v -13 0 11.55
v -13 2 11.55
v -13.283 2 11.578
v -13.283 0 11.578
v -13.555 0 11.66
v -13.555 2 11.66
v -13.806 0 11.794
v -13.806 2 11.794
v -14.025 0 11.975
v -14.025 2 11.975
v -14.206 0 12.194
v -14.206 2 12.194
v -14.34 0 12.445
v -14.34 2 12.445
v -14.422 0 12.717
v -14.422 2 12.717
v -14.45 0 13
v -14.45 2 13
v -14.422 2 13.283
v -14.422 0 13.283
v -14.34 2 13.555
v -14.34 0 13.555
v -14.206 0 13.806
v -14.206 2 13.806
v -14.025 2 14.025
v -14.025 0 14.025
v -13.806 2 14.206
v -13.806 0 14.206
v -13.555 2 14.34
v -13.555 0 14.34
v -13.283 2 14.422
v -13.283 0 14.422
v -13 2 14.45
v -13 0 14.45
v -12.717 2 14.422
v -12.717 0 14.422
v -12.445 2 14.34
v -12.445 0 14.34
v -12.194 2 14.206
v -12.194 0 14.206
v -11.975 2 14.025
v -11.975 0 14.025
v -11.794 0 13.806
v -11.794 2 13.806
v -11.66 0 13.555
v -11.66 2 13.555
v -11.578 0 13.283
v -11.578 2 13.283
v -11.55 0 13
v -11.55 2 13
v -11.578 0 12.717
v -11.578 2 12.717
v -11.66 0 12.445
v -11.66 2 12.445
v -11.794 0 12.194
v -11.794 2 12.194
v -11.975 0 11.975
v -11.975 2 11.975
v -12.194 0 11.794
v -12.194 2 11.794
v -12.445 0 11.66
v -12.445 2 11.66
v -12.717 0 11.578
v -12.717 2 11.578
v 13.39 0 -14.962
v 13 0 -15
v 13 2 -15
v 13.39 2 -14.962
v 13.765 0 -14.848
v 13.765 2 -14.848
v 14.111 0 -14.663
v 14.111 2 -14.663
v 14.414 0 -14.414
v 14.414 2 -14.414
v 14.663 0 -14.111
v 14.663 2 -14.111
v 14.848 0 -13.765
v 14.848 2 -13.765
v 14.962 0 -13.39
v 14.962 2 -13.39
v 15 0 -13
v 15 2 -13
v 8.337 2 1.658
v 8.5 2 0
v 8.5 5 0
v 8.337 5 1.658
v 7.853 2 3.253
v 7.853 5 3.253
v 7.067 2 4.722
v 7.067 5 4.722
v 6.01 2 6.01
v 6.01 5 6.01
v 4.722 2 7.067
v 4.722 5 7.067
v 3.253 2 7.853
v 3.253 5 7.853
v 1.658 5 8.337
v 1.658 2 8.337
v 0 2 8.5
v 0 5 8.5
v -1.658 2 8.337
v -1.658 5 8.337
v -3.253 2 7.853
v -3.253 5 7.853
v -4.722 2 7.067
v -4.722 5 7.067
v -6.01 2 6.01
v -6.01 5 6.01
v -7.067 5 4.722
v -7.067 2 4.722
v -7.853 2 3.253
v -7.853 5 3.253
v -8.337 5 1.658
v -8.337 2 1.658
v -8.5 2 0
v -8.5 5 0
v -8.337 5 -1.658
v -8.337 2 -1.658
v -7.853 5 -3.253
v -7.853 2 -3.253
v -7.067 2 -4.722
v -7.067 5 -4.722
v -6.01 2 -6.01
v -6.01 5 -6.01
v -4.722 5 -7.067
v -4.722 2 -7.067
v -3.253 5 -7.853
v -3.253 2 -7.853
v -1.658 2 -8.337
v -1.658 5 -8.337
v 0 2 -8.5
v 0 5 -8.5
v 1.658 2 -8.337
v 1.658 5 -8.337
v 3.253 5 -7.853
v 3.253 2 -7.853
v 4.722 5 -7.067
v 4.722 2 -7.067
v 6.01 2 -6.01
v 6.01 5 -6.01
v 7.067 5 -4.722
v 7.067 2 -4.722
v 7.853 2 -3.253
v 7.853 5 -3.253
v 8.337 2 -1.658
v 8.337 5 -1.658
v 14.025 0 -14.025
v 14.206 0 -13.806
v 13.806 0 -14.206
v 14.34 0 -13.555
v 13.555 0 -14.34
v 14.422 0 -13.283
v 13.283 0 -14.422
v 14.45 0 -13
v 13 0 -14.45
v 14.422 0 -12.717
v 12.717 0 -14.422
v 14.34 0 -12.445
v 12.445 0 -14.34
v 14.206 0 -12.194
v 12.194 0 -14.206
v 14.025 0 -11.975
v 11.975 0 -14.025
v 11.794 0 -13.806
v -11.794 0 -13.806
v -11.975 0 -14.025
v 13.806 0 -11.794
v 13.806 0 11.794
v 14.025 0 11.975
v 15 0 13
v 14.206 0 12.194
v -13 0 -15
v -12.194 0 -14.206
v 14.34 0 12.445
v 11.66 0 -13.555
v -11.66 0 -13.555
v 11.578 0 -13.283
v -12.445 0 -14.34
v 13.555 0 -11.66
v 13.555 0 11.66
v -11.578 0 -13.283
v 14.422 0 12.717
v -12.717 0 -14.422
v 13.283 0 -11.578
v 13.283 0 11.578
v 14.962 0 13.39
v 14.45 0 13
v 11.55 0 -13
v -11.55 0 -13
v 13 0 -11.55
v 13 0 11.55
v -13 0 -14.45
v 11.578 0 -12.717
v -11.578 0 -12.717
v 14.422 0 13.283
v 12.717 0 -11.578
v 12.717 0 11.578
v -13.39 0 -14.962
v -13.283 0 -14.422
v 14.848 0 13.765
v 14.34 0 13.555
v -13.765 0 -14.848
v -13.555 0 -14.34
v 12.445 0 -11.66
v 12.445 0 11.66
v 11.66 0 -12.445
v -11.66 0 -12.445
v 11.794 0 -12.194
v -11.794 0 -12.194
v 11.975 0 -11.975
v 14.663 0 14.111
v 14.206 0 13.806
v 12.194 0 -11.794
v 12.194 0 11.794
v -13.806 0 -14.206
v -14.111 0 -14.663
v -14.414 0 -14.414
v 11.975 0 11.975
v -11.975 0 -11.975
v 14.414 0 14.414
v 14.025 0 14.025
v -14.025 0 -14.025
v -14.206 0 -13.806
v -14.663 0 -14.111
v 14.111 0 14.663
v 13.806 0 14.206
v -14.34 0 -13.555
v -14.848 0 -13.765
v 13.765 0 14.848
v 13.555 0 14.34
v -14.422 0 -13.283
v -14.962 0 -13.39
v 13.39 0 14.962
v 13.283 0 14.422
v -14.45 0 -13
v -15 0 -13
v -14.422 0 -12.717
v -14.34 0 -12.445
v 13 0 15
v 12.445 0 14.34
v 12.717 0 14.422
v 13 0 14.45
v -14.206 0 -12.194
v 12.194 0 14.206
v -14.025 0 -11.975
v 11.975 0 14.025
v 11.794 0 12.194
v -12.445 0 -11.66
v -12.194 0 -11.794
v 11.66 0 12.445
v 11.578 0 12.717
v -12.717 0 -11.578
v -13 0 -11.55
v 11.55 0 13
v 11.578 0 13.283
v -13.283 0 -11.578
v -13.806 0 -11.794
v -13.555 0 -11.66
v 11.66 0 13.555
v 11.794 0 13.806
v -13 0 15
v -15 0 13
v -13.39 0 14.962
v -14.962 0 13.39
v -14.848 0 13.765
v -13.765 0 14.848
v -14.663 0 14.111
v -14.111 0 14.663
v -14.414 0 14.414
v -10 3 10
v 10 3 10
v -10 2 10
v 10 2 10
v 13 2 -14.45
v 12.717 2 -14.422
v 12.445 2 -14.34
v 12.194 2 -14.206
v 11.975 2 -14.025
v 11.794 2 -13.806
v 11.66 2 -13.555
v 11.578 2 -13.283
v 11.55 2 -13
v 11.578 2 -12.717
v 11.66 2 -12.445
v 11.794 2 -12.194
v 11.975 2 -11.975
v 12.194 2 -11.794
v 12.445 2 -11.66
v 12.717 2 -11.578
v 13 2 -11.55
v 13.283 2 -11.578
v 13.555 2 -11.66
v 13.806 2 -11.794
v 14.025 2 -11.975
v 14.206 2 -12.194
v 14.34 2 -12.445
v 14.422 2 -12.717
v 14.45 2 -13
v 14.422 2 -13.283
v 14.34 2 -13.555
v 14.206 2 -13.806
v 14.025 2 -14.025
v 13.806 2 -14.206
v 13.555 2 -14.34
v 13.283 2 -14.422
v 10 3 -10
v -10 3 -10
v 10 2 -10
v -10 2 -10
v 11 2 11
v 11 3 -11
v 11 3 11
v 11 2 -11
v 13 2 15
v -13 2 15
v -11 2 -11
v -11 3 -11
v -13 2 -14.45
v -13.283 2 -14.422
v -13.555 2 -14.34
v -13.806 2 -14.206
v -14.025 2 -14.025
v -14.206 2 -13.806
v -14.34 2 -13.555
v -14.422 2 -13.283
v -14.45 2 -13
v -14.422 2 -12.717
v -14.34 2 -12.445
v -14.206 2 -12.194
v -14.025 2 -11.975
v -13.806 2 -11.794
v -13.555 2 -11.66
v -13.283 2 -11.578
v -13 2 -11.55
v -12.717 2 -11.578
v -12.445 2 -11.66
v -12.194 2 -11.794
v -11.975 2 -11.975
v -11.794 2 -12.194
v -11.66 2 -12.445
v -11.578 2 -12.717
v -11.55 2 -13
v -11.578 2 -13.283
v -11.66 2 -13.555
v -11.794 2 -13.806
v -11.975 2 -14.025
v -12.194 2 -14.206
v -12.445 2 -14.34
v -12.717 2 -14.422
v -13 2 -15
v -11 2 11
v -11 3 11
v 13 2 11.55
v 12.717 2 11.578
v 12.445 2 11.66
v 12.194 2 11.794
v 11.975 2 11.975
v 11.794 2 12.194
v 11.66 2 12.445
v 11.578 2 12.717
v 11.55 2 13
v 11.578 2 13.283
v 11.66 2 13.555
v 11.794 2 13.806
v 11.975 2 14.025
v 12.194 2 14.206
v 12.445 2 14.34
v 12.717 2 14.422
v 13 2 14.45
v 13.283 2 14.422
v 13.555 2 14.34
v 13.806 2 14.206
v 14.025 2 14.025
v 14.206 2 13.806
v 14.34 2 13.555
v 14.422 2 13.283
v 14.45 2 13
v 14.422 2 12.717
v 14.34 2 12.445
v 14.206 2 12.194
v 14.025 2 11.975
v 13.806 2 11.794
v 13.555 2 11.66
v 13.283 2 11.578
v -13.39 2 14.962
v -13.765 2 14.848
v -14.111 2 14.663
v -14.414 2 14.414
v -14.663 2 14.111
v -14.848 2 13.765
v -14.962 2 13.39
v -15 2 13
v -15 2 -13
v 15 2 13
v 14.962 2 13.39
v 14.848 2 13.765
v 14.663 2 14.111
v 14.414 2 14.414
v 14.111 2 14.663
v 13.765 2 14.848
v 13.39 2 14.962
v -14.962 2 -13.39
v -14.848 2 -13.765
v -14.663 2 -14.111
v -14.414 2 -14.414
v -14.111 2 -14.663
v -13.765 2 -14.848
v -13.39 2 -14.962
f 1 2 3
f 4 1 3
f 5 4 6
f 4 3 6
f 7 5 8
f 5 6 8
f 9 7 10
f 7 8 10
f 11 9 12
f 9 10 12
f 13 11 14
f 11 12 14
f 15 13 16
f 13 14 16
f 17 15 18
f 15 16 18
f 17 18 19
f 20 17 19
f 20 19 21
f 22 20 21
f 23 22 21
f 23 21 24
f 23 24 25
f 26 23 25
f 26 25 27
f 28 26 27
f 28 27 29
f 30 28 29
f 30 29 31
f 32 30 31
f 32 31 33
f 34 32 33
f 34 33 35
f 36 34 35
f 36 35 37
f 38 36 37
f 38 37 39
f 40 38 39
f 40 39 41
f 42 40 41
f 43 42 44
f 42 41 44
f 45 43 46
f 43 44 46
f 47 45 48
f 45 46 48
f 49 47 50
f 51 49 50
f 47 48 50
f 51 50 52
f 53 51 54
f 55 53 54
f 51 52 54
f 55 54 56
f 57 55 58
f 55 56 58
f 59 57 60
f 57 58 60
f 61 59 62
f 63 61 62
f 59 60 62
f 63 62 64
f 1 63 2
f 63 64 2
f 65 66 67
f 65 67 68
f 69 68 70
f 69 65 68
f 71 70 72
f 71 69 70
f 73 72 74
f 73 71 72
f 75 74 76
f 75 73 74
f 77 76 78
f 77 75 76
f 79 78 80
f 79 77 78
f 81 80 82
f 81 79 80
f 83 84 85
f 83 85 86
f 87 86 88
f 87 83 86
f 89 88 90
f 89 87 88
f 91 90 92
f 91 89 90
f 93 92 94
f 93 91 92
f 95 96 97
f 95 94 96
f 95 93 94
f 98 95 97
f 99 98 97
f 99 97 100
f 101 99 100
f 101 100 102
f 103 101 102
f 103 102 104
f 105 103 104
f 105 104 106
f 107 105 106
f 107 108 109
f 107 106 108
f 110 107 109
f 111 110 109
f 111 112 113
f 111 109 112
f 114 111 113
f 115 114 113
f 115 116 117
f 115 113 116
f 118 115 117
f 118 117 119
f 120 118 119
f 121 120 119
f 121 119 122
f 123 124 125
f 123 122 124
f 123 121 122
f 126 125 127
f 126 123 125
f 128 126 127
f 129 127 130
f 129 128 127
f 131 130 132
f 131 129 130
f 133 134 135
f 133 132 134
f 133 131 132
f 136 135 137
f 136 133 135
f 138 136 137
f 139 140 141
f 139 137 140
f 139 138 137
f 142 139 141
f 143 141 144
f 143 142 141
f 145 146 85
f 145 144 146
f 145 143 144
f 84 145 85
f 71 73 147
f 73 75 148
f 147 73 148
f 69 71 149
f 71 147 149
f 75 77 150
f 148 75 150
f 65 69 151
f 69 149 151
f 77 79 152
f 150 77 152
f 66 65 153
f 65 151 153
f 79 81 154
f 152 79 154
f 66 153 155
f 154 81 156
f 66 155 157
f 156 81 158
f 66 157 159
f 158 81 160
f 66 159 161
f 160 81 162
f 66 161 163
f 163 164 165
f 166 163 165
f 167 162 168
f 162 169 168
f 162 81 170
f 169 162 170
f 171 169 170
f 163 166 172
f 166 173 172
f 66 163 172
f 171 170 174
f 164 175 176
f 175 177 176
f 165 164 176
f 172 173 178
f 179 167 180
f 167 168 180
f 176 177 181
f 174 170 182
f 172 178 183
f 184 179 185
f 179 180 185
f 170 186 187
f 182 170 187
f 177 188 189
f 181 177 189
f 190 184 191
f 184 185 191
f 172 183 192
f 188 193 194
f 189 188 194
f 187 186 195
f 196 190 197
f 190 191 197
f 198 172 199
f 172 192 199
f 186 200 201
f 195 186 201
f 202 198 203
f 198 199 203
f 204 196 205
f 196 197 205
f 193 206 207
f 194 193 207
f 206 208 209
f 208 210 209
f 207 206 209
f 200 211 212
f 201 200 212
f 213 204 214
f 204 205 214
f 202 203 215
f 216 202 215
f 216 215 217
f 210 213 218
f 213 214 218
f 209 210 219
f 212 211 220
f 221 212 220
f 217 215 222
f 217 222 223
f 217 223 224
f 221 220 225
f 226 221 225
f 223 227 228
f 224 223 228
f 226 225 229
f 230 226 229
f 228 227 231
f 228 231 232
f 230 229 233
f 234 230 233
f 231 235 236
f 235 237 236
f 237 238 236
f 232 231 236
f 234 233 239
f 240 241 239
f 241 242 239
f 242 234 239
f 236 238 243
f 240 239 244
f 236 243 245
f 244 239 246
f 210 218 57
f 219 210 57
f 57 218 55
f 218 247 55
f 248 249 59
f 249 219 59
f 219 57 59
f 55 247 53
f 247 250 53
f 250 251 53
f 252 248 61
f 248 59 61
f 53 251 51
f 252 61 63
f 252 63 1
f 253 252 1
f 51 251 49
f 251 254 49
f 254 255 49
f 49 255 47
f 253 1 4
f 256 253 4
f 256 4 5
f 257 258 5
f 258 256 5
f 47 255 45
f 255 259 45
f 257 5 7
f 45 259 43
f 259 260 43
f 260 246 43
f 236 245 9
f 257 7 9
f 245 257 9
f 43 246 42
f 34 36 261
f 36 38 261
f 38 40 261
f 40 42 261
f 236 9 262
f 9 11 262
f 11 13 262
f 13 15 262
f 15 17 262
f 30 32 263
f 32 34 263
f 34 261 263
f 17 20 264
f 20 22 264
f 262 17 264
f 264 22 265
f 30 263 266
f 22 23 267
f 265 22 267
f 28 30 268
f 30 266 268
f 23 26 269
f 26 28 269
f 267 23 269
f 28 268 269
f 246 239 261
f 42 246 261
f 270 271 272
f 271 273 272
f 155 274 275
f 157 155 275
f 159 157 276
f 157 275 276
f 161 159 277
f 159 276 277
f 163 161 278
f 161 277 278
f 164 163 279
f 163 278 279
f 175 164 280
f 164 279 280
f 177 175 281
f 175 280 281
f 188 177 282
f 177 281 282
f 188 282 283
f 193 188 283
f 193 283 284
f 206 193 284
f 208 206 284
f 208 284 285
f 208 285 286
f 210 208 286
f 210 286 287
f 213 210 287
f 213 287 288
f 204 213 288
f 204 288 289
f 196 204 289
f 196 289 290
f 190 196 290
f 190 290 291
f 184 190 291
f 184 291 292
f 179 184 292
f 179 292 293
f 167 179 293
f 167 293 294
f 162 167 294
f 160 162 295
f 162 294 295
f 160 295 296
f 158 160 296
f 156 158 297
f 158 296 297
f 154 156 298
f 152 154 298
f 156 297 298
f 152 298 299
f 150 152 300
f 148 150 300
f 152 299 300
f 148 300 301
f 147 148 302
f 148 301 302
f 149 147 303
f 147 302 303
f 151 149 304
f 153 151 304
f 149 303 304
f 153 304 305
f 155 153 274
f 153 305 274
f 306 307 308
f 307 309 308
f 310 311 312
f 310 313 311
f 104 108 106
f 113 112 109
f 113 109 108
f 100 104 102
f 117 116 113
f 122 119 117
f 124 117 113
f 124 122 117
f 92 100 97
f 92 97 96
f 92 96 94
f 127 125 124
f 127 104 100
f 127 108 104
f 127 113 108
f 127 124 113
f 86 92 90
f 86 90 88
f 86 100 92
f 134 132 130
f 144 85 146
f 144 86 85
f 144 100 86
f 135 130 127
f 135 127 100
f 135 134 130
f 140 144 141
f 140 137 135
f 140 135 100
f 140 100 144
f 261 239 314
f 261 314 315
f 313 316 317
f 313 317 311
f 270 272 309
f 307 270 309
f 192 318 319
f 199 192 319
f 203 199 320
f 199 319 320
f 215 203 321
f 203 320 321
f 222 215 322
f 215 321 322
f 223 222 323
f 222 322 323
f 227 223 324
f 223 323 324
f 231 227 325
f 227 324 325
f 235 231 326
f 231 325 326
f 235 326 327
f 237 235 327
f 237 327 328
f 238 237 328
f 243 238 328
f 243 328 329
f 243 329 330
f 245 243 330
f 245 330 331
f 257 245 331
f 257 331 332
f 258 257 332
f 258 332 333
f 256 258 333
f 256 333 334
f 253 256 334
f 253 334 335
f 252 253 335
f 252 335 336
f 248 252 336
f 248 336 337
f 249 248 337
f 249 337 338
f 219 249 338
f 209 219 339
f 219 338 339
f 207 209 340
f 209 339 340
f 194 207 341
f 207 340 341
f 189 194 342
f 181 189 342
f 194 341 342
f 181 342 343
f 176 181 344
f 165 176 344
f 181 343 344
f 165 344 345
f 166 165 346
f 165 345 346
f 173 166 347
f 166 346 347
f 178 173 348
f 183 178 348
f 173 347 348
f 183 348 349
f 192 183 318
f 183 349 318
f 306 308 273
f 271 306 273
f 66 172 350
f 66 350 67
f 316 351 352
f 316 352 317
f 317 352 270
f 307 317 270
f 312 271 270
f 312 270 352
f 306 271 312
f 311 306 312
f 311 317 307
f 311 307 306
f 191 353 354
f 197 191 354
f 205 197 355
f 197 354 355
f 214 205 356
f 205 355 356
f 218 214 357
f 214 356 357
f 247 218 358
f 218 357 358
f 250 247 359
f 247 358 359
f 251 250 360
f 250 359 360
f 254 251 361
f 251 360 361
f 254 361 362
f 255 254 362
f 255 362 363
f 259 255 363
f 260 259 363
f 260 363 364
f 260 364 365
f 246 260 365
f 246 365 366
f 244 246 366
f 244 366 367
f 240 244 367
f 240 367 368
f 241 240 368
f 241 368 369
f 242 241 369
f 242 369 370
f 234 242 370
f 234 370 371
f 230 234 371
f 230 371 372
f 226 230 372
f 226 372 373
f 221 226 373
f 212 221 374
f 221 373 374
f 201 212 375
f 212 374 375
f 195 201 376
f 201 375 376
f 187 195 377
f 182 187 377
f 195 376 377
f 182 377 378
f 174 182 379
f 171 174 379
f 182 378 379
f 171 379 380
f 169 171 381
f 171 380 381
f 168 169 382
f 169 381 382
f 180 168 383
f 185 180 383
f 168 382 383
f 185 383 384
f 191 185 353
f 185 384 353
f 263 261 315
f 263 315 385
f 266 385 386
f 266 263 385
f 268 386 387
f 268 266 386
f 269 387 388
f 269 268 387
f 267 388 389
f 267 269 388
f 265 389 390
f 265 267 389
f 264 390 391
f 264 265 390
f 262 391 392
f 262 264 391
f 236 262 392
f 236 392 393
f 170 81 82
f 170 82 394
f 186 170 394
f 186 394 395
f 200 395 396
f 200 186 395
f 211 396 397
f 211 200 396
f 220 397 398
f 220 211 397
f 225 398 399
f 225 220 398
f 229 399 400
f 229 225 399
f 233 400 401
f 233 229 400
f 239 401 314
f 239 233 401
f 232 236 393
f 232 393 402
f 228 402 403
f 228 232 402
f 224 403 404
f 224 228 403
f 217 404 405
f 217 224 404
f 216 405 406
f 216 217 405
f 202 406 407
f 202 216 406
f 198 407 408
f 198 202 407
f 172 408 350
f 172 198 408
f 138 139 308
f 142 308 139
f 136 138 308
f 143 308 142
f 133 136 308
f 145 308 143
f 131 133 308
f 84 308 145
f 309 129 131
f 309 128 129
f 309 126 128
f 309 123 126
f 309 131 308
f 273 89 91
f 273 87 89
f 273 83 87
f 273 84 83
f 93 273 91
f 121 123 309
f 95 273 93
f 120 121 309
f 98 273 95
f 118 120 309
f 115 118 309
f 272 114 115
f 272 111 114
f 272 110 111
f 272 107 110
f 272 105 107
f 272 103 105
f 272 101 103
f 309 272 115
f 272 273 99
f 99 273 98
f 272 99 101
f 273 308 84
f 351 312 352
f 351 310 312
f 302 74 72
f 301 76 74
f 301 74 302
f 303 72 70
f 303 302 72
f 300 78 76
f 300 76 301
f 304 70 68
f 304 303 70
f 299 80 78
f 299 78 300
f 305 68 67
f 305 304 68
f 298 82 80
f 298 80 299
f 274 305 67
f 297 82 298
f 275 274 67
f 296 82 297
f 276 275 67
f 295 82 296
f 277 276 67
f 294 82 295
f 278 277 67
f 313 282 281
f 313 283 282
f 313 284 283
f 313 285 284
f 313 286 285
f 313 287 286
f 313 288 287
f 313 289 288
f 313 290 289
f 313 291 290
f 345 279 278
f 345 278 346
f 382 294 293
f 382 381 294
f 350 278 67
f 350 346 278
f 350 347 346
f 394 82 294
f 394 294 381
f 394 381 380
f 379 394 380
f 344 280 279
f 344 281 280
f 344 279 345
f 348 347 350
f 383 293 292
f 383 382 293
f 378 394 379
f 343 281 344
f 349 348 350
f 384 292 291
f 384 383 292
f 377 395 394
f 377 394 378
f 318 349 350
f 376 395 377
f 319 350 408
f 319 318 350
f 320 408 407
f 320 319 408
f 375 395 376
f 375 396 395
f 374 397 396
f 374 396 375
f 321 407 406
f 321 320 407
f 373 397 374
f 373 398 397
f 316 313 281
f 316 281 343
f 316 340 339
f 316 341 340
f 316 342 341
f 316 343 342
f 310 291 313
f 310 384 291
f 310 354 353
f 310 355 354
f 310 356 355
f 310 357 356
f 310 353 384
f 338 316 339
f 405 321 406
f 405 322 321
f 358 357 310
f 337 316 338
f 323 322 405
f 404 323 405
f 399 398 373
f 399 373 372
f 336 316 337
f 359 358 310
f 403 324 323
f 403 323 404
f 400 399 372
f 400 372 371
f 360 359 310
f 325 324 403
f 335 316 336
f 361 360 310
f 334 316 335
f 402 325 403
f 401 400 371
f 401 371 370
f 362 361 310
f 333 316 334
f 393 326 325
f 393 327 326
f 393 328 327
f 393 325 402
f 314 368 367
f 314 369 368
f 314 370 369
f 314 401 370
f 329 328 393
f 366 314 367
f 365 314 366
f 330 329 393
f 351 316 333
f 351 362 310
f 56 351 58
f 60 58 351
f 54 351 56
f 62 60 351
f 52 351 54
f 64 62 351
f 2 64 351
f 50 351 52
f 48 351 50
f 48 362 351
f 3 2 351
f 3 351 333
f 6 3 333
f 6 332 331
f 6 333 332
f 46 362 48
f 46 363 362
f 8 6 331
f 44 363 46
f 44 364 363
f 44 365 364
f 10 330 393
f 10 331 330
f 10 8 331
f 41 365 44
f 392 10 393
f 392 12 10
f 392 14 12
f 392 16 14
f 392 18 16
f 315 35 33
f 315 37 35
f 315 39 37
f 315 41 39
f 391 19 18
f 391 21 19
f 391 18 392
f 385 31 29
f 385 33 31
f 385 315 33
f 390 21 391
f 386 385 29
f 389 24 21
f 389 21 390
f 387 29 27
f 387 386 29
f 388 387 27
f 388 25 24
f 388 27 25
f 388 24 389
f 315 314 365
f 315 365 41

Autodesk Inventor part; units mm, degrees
ref_plane "YZ Plane" through (0, 0, 0) normal (1, 0, 0) x (0, 1, 0)
ref_plane "XZ Plane" through (0, 0, 0) normal (0, 1, 0) x (-1, 0, 0)
ref_plane "XY Plane" through (0, 0, 0) normal (0, 0, 1) x (1, 0, 0)
sketch "Boceto1" plane through (0, 0, 0) normal (0, 1, 0) x (-1, 0, 0)
  line L0 (-13, 15) -> (13, 15)
  line L1 (15, 13) -> (15, -13)
  line L2 (13, -15) -> (-13, -15)
  line L3 (-15, -13) -> (-15, 13)
  line L4 (-15, 15) -> (15, -15) construction
  line L5 (15, 15) -> (-15, -15) construction
  arc A0 (13, -15) -> (15, -13) centre (13, -13) ccw
  arc A1 (15, 13) -> (13, 15) centre (13, 13) ccw
  arc A2 (-13, 15) -> (-15, 13) centre (-13, 13) ccw
  arc A3 (-15, -13) -> (-13, -15) centre (-13, -13) ccw
  point P0 (0, 0)
  dimension "d0" = 30
  dimension "d1" = 30
  dimension "d2" = 2
extrude "Extrusión1" add sketch "Boceto1" along normal blind 2
sketch "Boceto2" plane through (0, 2, 0) normal (0, 1, 0) x (1, 0, 0)
  circle A0 centre (0, 0) radius 8.5
  dimension "d5" = 17
extrude "Extrusión2" add sketch "Boceto2" along normal blind 3
sketch "Boceto3" plane through (0, 2, 0) normal (0, 1, 0) x (1, 0, 0)
  line L0 (10, -10) -> (-10, -10)
  line L1 (-10, -10) -> (-10, 10)
  line L2 (-10, 10) -> (10, 10)
  line L3 (10, 10) -> (10, -10)
  line L4 (10, -10) -> (-10, 10) construction
  line L5 (-10, -10) -> (10, 10) construction
  line L6 (11, -11) -> (-11, -11)
  line L7 (-11, -11) -> (-11, 11)
  line L8 (-11, 11) -> (11, 11)
  line L9 (11, 11) -> (11, -11)
  line L10 (11, -11) -> (-11, 11) construction
  line L11 (-11, -11) -> (11, 11) construction
  point P0 (0, 0)
  dimension "d8" = 1
  dimension "d9" = 1
  dimension "d10" = 10
  dimension "d11" = 10
extrude "Extrusión3" add sketch "Boceto3" along normal blind 1
sketch "Boceto4" plane through (0, 0, 0) normal (0, -1, 0) x (1, 0, 0)
  point P0 (13, -13)
  point P1 (-13, -13)
hole "Agujero1" at (13, 0, -13) at (-13, 0, -13) direction (0, 1, 0) diameter 2.9 end through all
sketch "Boceto5" plane through (0, 0, 0) normal (0, -1, 0) x (1, 0, 0)
  point P0 (-13, 13)
hole "Agujero2" at (-13, 0, 13) direction (0, 1, 0) diameter 2.9 end through all
sketch "Boceto6" plane through (0, 0, 0) normal (0, -1, 0) x (1, 0, 0)
  point P0 (13, 13)
hole "Agujero3" at (13, 0, 13) direction (0, 1, 0) diameter 2.9 end through all
properties part number "Tapa trasera" material "Plástico PET"
